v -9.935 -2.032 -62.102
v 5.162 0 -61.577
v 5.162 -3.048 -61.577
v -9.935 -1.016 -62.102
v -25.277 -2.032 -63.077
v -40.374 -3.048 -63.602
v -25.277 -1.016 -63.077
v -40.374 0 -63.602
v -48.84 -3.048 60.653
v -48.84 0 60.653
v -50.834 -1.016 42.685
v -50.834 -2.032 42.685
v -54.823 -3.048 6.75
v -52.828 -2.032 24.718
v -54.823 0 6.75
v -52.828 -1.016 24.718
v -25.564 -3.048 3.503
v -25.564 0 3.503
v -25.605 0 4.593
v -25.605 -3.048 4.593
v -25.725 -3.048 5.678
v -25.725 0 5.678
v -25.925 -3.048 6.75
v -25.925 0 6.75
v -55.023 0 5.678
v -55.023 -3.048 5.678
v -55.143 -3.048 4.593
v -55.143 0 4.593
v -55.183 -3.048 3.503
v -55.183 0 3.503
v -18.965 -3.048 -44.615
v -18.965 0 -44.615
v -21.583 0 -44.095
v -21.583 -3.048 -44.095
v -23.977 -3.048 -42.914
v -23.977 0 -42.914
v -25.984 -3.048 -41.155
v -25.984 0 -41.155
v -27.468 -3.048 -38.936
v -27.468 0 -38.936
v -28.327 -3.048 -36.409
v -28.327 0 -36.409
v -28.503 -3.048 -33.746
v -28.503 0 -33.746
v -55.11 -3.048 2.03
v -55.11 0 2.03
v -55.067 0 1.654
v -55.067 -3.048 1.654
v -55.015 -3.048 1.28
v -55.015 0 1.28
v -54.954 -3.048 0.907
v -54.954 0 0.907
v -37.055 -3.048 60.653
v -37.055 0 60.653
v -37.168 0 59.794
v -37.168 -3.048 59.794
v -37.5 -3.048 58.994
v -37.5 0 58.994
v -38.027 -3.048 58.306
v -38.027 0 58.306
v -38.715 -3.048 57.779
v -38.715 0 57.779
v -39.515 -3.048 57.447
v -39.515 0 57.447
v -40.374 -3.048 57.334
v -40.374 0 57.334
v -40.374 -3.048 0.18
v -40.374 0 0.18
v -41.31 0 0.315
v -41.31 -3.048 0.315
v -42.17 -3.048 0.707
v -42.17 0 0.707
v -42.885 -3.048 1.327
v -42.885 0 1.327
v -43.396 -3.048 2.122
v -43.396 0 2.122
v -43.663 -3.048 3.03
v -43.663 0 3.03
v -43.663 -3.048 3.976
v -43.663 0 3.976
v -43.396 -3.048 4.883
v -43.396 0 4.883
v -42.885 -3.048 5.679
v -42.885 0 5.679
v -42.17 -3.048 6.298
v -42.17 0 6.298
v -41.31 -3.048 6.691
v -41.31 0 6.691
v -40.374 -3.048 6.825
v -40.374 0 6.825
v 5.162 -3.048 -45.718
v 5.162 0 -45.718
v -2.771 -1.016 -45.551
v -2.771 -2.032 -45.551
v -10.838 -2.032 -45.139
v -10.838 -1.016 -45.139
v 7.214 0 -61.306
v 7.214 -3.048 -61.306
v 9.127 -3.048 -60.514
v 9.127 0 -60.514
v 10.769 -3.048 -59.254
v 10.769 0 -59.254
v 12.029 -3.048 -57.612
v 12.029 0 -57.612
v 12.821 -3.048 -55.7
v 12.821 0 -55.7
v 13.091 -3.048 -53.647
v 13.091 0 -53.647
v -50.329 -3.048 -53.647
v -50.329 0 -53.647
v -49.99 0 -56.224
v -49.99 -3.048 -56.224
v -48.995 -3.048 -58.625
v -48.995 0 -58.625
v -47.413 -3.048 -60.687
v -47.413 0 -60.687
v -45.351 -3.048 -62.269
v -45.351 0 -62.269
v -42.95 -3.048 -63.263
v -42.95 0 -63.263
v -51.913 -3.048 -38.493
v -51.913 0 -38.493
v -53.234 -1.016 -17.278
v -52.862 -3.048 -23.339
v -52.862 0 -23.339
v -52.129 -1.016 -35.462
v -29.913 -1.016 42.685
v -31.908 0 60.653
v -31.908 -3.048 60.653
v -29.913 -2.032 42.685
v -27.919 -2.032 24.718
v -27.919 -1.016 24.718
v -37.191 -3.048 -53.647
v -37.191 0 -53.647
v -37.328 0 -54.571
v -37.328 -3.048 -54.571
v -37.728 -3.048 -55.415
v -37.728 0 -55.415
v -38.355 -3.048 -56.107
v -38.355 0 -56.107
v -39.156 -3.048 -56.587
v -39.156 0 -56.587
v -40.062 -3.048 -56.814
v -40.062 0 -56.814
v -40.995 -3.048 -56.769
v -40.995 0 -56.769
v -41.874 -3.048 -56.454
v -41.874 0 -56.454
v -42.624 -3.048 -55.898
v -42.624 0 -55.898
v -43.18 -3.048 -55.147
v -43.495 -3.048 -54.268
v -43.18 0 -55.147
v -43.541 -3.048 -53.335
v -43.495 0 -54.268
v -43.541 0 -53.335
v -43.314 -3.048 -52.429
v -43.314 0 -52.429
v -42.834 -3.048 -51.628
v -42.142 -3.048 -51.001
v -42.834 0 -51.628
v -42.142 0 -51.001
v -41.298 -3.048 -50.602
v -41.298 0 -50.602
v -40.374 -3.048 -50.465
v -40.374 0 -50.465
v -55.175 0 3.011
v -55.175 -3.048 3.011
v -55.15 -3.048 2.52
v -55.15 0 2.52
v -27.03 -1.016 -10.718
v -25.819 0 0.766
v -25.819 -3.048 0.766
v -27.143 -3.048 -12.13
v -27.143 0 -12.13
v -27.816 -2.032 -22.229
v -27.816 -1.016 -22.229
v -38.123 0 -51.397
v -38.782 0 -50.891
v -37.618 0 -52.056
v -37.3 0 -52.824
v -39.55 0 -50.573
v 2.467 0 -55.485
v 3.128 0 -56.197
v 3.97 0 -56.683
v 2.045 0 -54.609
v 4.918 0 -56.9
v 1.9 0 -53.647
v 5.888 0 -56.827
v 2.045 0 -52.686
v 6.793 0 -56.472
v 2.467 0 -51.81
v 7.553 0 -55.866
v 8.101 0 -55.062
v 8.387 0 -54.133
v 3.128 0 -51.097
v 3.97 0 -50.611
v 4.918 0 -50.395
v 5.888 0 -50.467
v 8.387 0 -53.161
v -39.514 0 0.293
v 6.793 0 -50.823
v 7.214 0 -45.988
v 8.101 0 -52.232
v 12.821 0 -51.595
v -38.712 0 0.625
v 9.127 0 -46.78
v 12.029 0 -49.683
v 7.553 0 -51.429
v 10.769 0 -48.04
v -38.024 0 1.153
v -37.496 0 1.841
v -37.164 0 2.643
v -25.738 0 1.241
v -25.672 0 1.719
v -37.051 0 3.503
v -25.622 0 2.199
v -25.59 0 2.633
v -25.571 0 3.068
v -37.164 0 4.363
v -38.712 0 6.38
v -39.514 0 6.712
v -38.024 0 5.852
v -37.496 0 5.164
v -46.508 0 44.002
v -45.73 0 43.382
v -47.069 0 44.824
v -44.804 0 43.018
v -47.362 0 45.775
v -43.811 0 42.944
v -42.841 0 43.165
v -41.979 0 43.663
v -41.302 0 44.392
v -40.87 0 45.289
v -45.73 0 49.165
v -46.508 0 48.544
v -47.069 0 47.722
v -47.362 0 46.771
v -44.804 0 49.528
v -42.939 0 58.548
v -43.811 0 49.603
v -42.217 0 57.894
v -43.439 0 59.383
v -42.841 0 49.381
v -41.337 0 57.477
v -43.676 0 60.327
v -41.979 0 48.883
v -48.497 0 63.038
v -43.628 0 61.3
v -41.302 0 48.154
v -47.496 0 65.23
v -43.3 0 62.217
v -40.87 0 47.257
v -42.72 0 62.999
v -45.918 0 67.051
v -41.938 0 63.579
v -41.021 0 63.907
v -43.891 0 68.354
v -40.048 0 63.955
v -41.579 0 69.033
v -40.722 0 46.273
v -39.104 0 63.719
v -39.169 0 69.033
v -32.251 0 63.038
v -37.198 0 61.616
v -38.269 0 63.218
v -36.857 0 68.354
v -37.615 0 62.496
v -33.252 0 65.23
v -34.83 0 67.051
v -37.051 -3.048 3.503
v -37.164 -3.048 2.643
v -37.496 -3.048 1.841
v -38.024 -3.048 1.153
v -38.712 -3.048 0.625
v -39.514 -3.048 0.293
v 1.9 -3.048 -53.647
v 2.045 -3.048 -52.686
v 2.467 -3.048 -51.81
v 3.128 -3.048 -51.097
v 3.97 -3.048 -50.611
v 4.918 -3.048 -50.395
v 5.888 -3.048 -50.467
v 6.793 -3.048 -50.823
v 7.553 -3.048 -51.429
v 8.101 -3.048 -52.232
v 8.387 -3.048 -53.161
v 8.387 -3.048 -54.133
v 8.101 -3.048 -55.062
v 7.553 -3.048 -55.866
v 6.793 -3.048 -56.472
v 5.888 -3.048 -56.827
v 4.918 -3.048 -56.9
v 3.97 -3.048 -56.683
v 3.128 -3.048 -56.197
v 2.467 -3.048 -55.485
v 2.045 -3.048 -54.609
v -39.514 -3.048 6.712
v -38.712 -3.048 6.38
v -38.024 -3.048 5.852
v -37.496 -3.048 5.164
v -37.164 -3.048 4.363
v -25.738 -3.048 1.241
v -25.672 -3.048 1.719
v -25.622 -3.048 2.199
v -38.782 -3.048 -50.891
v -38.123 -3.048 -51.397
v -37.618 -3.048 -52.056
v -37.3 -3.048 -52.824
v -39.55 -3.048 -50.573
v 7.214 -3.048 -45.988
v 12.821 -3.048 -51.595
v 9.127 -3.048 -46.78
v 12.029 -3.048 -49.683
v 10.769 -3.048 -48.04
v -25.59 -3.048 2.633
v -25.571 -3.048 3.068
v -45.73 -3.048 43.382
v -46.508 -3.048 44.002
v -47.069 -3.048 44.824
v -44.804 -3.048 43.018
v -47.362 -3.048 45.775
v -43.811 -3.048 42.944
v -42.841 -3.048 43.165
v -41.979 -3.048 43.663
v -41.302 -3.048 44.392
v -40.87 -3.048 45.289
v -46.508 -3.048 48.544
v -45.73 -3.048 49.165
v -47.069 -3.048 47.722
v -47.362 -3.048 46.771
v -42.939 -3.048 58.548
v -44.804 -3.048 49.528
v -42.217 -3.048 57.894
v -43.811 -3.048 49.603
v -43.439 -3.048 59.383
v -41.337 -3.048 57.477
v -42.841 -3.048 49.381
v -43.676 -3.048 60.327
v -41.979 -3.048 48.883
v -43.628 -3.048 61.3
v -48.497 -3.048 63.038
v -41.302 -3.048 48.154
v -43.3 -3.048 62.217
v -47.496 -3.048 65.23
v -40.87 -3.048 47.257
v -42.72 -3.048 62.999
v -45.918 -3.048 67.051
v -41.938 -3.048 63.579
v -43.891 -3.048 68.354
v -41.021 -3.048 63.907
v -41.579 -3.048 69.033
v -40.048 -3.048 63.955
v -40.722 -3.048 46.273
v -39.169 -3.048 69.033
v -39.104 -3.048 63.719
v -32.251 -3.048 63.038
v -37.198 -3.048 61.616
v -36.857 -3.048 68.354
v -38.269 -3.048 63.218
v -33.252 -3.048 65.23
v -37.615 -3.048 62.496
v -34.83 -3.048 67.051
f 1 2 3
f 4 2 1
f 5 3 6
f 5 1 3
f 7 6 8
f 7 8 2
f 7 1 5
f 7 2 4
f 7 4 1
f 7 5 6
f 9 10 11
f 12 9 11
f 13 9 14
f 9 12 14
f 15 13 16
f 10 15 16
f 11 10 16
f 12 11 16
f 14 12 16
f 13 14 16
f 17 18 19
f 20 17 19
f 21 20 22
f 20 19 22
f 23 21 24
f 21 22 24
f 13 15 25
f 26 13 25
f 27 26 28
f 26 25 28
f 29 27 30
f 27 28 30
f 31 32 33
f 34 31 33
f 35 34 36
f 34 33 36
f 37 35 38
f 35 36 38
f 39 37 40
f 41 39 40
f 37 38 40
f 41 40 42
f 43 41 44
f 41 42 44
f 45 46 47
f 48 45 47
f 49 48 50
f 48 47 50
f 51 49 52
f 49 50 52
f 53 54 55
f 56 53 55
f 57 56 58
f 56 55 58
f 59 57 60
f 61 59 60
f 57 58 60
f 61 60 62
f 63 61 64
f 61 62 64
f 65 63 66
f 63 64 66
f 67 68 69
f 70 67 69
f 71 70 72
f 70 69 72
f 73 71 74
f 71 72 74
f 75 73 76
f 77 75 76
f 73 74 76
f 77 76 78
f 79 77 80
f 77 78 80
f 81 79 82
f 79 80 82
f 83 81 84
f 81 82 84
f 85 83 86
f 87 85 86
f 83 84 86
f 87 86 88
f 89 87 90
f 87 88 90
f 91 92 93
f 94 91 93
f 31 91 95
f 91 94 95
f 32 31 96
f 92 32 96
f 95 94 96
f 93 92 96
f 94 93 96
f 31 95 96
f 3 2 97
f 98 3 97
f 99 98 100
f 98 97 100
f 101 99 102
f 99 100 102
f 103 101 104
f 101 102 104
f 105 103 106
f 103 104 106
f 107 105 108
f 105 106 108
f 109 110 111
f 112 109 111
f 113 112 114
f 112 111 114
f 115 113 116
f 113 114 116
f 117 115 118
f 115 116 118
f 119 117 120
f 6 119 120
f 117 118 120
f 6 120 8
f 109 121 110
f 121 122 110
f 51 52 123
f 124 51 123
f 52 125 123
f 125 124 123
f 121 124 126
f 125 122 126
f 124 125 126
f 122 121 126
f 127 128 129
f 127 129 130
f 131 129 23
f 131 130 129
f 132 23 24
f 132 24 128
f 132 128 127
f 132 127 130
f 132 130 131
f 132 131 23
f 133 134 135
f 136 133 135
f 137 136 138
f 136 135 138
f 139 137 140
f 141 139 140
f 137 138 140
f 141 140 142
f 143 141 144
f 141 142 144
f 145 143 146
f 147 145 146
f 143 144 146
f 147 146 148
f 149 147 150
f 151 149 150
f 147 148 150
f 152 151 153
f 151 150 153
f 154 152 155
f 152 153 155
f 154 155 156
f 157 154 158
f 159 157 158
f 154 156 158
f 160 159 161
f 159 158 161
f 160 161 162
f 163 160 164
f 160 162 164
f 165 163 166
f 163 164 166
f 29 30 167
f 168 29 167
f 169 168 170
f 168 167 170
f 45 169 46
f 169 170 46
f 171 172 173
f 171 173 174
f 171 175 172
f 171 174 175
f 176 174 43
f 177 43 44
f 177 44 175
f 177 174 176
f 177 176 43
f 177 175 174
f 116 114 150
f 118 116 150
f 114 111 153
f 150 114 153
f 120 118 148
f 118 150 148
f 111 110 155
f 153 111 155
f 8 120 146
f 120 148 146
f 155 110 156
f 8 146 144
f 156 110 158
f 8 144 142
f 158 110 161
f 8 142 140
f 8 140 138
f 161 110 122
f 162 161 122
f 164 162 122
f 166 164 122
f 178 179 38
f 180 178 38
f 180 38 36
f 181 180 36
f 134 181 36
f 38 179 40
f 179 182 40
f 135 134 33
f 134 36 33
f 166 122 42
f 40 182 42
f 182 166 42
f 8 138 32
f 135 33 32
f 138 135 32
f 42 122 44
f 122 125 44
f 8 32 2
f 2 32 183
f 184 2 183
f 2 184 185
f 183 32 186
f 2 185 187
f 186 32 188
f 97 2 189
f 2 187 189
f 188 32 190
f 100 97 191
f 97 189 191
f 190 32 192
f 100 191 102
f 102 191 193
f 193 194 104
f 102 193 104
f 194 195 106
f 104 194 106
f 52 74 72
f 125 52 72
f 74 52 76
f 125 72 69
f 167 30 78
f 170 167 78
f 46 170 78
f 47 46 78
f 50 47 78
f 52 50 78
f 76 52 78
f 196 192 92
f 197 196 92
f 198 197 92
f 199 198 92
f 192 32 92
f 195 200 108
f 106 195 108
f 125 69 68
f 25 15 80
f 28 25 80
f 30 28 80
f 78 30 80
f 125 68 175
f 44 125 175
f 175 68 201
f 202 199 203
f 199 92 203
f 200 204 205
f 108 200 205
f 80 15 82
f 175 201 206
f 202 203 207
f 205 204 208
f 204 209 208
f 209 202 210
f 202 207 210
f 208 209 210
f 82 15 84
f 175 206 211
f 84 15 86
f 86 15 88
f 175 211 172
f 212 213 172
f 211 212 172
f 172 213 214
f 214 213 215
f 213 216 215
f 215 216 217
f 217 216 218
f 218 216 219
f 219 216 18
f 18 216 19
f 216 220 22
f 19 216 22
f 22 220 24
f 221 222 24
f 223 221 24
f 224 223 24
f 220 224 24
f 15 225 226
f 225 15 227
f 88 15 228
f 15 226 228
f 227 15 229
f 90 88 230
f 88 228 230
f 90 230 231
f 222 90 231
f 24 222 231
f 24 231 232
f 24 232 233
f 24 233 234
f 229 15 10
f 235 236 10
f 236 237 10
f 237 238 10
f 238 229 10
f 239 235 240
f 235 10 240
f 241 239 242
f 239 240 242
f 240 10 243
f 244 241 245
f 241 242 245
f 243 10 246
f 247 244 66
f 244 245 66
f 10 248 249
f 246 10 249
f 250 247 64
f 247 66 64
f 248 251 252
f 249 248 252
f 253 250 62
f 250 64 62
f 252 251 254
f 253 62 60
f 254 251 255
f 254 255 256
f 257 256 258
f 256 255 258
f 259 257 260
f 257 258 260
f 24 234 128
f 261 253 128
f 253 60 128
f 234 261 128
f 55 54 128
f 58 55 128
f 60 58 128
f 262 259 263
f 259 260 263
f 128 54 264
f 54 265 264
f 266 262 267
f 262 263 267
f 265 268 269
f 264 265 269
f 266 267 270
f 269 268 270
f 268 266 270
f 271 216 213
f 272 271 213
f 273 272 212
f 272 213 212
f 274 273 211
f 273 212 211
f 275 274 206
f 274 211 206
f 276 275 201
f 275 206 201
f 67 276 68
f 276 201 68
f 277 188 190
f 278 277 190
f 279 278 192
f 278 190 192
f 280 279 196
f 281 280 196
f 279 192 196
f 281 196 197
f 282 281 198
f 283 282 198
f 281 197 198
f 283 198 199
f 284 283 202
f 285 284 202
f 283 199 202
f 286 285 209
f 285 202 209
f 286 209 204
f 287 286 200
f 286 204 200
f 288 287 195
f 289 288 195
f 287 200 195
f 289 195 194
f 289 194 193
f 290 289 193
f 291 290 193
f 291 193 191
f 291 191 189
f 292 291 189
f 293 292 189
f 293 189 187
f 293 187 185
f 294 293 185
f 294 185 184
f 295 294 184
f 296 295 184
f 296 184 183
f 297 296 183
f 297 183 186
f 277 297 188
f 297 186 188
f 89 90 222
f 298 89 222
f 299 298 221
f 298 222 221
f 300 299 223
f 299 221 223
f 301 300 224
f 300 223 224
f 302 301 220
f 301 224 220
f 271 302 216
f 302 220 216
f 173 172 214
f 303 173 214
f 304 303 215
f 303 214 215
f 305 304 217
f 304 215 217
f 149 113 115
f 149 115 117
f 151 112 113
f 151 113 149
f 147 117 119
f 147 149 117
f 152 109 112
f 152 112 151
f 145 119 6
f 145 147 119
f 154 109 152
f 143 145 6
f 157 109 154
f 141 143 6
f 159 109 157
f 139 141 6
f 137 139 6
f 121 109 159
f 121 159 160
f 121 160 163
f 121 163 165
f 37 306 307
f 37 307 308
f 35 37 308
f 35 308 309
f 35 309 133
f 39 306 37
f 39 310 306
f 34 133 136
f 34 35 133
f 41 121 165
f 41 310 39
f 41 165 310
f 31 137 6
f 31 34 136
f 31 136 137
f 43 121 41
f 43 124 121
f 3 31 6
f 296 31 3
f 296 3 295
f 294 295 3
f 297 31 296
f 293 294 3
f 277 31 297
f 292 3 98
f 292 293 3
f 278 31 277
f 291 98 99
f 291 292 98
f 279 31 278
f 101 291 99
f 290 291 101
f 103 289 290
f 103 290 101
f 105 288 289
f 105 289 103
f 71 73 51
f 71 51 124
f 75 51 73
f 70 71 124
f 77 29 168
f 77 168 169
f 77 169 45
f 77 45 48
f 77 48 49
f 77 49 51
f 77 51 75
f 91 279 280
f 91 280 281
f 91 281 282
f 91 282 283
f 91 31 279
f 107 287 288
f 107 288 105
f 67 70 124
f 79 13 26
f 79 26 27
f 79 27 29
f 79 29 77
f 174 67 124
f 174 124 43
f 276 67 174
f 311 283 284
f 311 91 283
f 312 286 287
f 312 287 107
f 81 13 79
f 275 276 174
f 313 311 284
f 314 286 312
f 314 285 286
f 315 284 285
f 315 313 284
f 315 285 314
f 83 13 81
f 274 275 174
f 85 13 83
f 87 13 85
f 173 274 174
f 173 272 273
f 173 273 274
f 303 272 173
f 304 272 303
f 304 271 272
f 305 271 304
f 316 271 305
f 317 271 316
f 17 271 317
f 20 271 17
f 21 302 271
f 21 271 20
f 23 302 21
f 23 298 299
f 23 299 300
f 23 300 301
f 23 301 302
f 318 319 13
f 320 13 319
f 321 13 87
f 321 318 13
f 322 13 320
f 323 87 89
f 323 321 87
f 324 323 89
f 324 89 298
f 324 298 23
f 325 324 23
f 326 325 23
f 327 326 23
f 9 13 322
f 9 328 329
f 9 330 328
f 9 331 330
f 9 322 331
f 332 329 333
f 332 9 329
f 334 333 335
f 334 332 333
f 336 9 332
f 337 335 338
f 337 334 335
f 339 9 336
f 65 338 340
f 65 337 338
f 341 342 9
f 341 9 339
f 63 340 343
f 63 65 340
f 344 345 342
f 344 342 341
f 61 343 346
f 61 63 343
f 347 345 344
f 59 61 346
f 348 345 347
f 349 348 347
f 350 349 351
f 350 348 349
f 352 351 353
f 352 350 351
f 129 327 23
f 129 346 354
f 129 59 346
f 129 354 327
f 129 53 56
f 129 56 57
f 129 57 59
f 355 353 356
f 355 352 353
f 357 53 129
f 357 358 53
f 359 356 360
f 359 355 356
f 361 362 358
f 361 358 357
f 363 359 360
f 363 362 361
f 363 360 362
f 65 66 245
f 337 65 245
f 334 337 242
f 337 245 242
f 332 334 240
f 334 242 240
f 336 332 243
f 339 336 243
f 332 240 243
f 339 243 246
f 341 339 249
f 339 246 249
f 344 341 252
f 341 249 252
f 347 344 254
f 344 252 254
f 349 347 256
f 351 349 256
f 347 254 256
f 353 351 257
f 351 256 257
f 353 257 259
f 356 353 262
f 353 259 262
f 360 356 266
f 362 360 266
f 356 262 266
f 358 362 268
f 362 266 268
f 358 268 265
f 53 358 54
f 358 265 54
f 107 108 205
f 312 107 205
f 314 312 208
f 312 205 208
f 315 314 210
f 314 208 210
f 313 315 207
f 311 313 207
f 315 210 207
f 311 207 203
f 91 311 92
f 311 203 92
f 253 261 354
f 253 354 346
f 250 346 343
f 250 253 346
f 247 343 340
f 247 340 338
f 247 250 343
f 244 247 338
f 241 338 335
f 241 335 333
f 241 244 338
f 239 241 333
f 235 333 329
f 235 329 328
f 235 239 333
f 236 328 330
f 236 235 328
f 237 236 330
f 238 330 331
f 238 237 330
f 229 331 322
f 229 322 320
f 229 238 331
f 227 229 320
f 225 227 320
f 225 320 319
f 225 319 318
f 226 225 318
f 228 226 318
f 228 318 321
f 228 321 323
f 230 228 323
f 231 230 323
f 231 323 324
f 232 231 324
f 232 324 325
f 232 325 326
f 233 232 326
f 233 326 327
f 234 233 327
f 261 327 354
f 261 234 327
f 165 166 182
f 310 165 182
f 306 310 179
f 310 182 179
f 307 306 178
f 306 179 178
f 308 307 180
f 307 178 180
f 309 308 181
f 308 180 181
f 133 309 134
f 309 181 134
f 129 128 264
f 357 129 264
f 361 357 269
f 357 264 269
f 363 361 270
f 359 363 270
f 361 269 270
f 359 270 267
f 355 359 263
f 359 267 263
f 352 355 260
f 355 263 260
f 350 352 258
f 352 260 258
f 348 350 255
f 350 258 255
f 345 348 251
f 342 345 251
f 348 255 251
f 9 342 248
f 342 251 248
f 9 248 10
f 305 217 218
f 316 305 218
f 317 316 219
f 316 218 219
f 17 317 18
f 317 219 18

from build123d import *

# Parameters (mm, degrees)
F0_R     = 3.338805446
F1_DEPTH = 3.048


with BuildPart() as f1:
    # F0 (on Front) → F1 (new body)
    with BuildSketch(Plane.XZ):
        with BuildLine():
            ThreePointArc((-48.8398405267, 60.6527402997), (-46.3601680284, 54.6662813241), (-40.3737090528, 52.1866088258))
            ThreePointArc((-40.3737090528, 52.1866088258), (-34.3872500772, 54.6662813241), (-31.9075775789, 60.6527402997))
            ThreePointArc((-31.9075775789, 60.6527402997), (-40.3737090528, 69.1188717736), (-48.8398405267, 60.6527402997))
        make_face()
        with BuildLine():
            ThreePointArc((-37.0553247631, 60.6527402997), (-38.0272570189, 58.3062882658), (-40.3737090528, 57.33435601))
            ThreePointArc((-40.3737090528, 57.33435601), (-42.7201610867, 62.9991923336), (-37.0553247631, 60.6527402997))
        make_face(mode=Mode.SUBTRACT)
        with BuildLine():
            ThreePointArc((-31.9075775789, 60.6527402997), (-34.3872500772, 54.6662813241), (-40.3737090528, 52.1866088258))
            Line((-40.3737090528, 52.1866088258), (-40.3737090528, 18.3121075428))
            ThreePointArc((-40.3737090528, 18.3121075428), (-31.1210192063, 15.0658316355), (-25.9247871381, 6.75019883))
            add(Edge.make_bspline(
                [(-31.9075775789, 60.6527402997), (-29.9133140986, 42.6852264765), (-27.9190506183, 24.7177126532), (-25.9247871381, 6.75019883)],
                knots=[0, 0, 0, 0, 54.2335482737, 54.2335482737, 54.2335482737, 54.2335482737], degree=3))
        make_face()
        with BuildLine():
            Line((-40.3737090528, 18.3121075428), (-40.3737090528, 52.1866088258))
            ThreePointArc((-40.3737090528, 52.1866088258), (-46.3601680284, 54.6662813241), (-48.8398405267, 60.6527402997))
            add(Edge.make_bspline(
                [(-48.8398405267, 60.6527402997), (-50.834104007, 42.6852264765), (-52.8283674873, 24.7177126532), (-54.8226309675, 6.75019883)],
                knots=[0, 0, 0, 0, 54.2335482737, 54.2335482737, 54.2335482737, 54.2335482737], degree=3))
            ThreePointArc((-54.8226309675, 6.75019883), (-49.6263988993, 15.0658316355), (-40.3737090528, 18.3121075428))
        make_face()
        with Locations((-44.0608076751, 46.2730638683)):
            Circle(F0_R, mode=Mode.SUBTRACT)
        with BuildLine():
            ThreePointArc((-25.9247871381, 6.75019883), (-31.1210192063, 15.0658316355), (-40.3737090528, 18.3121075428))
            Line((-40.3737090528, 18.3121075428), (-40.3737090528, 6.825499461))
            ThreePointArc((-40.3737090528, 6.825499461), (-38.0241643353, 5.8522861736), (-37.0509510478, 3.502741456))
            ThreePointArc((-37.0509510478, 3.502741456), (-38.0241643353, 1.1531967385), (-40.3737090528, 0.1799834511))
            Line((-40.3737090528, 0.1799834511), (-40.3737090528, -11.3066246308))
            ThreePointArc((-40.3737090528, -11.3066246308), (-30.9189329127, -7.8957028253), (-25.8194413828, 0.7658423924))
            add(Edge.make_bspline(
                [(-25.6218092077, 2.199370882), (-25.689716363, 1.7216544124), (-25.7555582996, 1.2438093753), (-25.8194413828, 0.7658423924)],
                knots=[0, 0, 0, 0, 1.4434370692, 1.4434370692, 1.4434370692, 1.4434370692], degree=3))
            ThreePointArc((-25.6218092077, 2.199370882), (-25.5787165017, 2.850423048), (-25.564342966, 3.502741456))
            add(Edge.make_bspline(
                [(-25.9247871381, 6.75019883), (-25.8046390807, 5.6677130387), (-25.6844910233, 4.5852272473), (-25.564342966, 3.502741456)],
                knots=[54.2335482737, 54.2335482737, 54.2335482737, 54.2335482737, 57.500947759, 57.500947759, 57.500947759, 57.500947759], degree=3))
        make_face()
        with BuildLine():
            Line((-40.3737090528, 6.825499461), (-40.3737090528, 18.3121075428))
            ThreePointArc((-40.3737090528, 18.3121075428), (-49.6263988993, 15.0658316355), (-54.8226309675, 6.75019883))
            add(Edge.make_bspline(
                [(-54.8226309675, 6.75019883), (-54.9427790249, 5.6677130387), (-55.0629270823, 4.5852272473), (-55.1830751396, 3.502741456)],
                knots=[54.2335482737, 54.2335482737, 54.2335482737, 54.2335482737, 57.500947759, 57.500947759, 57.500947759, 57.500947759], degree=3))
            ThreePointArc((-55.1830751396, 3.502741456), (-55.16469891, 2.7652165843), (-55.1096158257, 2.0295220307))
            add(Edge.make_bspline(
                [(-55.1096158257, 2.0295220307), (-55.0564401475, 1.6554290587), (-55.0045376129, 1.2813360137), (-54.9538568961, 0.9072428986)],
                knots=[0, 0, 0, 0, 1.1264122236, 1.1264122236, 1.1264122236, 1.1264122236], degree=3))
            ThreePointArc((-54.9538568961, 0.9072428986), (-49.8836942152, -7.8496814617), (-40.3737090528, -11.3066246308))
            Line((-40.3737090528, -11.3066246308), (-40.3737090528, 0.1799834511))
            ThreePointArc((-40.3737090528, 0.1799834511), (-43.6964670578, 3.502741456), (-40.3737090528, 6.825499461))
        make_face()
        with BuildLine():
            ThreePointArc((-25.564342966, 3.502741456), (-25.6547298408, 5.1364411987), (-25.9247871381, 6.75019883))
            add(Edge.make_bspline(
                [(-25.9247871381, 6.75019883), (-25.8046390807, 5.6677130387), (-25.6844910233, 4.5852272473), (-25.564342966, 3.502741456)],
                knots=[54.2335482737, 54.2335482737, 54.2335482737, 54.2335482737, 57.500947759, 57.500947759, 57.500947759, 57.500947759], degree=3))
        make_face()
        with BuildLine():
            add(Edge.make_bspline(
                [(-54.8226309675, 6.75019883), (-54.9427790249, 5.6677130387), (-55.0629270823, 4.5852272473), (-55.1830751396, 3.502741456)],
                knots=[54.2335482737, 54.2335482737, 54.2335482737, 54.2335482737, 57.500947759, 57.500947759, 57.500947759, 57.500947759], degree=3))
            ThreePointArc((-54.8226309675, 6.75019883), (-55.0926882648, 5.1364411987), (-55.1830751396, 3.502741456))
        make_face()
        with BuildLine():
            ThreePointArc((-25.8194413828, 0.7658423924), (-30.9189329127, -7.8957028253), (-40.3737090528, -11.3066246308))
            Line((-40.3737090528, -11.3066246308), (-40.3737090528, -43.6920970678))
            add(Edge.make_bspline(
                [(-29.2968091513, -43.9985364744), (-33.0339667691, -43.8142378214), (-36.7371842262, -43.69209709), (-40.3737090528, -43.6920970678)],
                knots=[34.3884430891, 34.3884430891, 34.3884430891, 34.3884430891, 45.5806839994, 45.5806839994, 45.5806839994, 45.5806839994], degree=3))
            add(Edge.make_bspline(
                [(-28.5031349311, -33.745569321), (-28.7247903418, -37.1658958874), (-28.9765210206, -40.5843501576), (-29.2968091568, -43.9985364736)],
                knots=[36.0644801438, 36.0644801438, 36.0644801438, 36.0644801438, 46.3497924724, 46.3497924724, 46.3497924724, 46.3497924724], degree=3))
            add(Edge.make_bspline(
                [(-25.8194413828, 0.7658423924), (-27.3516862062, -10.698263565), (-27.7570281259, -22.2325233774), (-28.5031349311, -33.745569321)],
                knots=[1.4434370692, 1.4434370692, 1.4434370692, 1.4434370692, 36.0644801438, 36.0644801438, 36.0644801438, 36.0644801438], degree=3))
        make_face()
        with BuildLine():
            Line((-40.3737090528, -43.6920970678), (-40.3737090528, -11.3066246308))
            ThreePointArc((-40.3737090528, -11.3066246308), (-49.8836942152, -7.8496814617), (-54.9538568961, 0.9072428986))
            add(Edge.make_bspline(
                [(-54.9538568961, 0.9072428986), (-52.4902517713, -17.2775376799), (-52.9137553274, -35.4624837616), (-50.3288693726, -53.6472573876)],
                knots=[1.1264122236, 1.1264122236, 1.1264122236, 1.1264122236, 55.8816544409, 55.8816544409, 55.8816544409, 55.8816544409], degree=3))
            ThreePointArc((-50.3288693726, -53.6472573876), (-47.4130704227, -46.6078960177), (-40.3737090528, -43.6920970678))
        make_face()
        with BuildLine():
            ThreePointArc((-25.8194413828, 0.7658423924), (-25.703105296, 1.4801912576), (-25.6218092077, 2.199370882))
            add(Edge.make_bspline(
                [(-25.6218092077, 2.199370882), (-25.689716363, 1.7216544124), (-25.7555582996, 1.2438093753), (-25.8194413828, 0.7658423924)],
                knots=[0, 0, 0, 0, 1.4434370692, 1.4434370692, 1.4434370692, 1.4434370692], degree=3))
        make_face()
        with BuildLine():
            add(Edge.make_bspline(
                [(-55.1096158257, 2.0295220307), (-55.0564401475, 1.6554290587), (-55.0045376129, 1.2813360137), (-54.9538568961, 0.9072428986)],
                knots=[0, 0, 0, 0, 1.1264122236, 1.1264122236, 1.1264122236, 1.1264122236], degree=3))
            ThreePointArc((-55.1096158257, 2.0295220307), (-55.0424732194, 1.466892317), (-54.9538568961, 0.9072428986))
        make_face()
        with BuildLine():
            ThreePointArc((-30.418548733, -53.6472573876), (-33.3343476829, -46.6078960177), (-40.3737090528, -43.6920970678))
            Line((-40.3737090528, -43.6920970678), (-40.3737090528, -50.4648009147))
            ThreePointArc((-40.3737090528, -50.4648009147), (-38.1233724999, -51.3969208348), (-37.1912525798, -53.6472573876))
            Line((-37.1912525798, -53.6472573876), (-30.418548733, -53.6472573876))
        make_face()
        with BuildLine():
            add(Edge.make_bspline(
                [(-29.2968091513, -43.9985364744), (-33.0339667691, -43.8142378214), (-36.7371842262, -43.69209709), (-40.3737090528, -43.6920970678)],
                knots=[34.3884430891, 34.3884430891, 34.3884430891, 34.3884430891, 45.5806839994, 45.5806839994, 45.5806839994, 45.5806839994], degree=3))
            ThreePointArc((-40.3737090528, -43.6920970678), (-33.3343476829, -46.6078960177), (-30.418548733, -53.6472573876))
            add(Edge.make_bspline(
                [(-29.2968091568, -43.9985364736), (-29.5989469592, -47.2192450606), (-29.9620922477, -50.4361557069), (-30.418548733, -53.6472573876)],
                knots=[46.3497924724, 46.3497924724, 46.3497924724, 46.3497924724, 56.0522488324, 56.0522488324, 56.0522488324, 56.0522488324], degree=3))
        make_face()
        with BuildLine():
            Line((-40.3737090528, -50.4648009147), (-40.3737090528, -43.6920970678))
            ThreePointArc((-40.3737090528, -43.6920970678), (-47.4130704227, -46.6078960177), (-50.3288693726, -53.6472573876))
            ThreePointArc((-50.3288693726, -53.6472573876), (-47.4130704227, -60.6866187576), (-40.3737090528, -63.6024177074))
            ThreePointArc((-40.3737090528, -63.6024177074), (-33.3343476829, -60.6866187576), (-30.418548733, -53.6472573876))
            Line((-30.418548733, -53.6472573876), (-37.1912525798, -53.6472573876))
            ThreePointArc((-37.1912525798, -53.6472573876), (-42.6240456057, -55.8975939405), (-40.3737090528, -50.4648009147))
        make_face()
        with BuildLine():
            Line((-2.7674630824, -53.6472573876), (-30.418548733, -53.6472573876))
            ThreePointArc((-30.418548733, -53.6472573876), (-33.3343476829, -60.6866187576), (-40.3737090528, -63.6024177074))
            add(Edge.make_bspline(
                [(5.1619368605, -61.5766573305), (-9.6479024117, -61.5766574207), (-25.5638697806, -63.6024176172), (-40.3737090528, -63.6024177074)],
                knots=[0, 0, 0, 0, 45.5806839994, 45.5806839994, 45.5806839994, 45.5806839994], degree=3))
            ThreePointArc((5.1619368605, -61.5766573305), (-0.4449956098, -59.254189858), (-2.7674630824, -53.6472573876))
        make_face()
        with BuildLine():
            add(Edge.make_bspline(
                [(-29.2968091568, -43.9985364736), (-29.5989469592, -47.2192450606), (-29.9620922477, -50.4361557069), (-30.418548733, -53.6472573876)],
                knots=[46.3497924724, 46.3497924724, 46.3497924724, 46.3497924724, 56.0522488324, 56.0522488324, 56.0522488324, 56.0522488324], degree=3))
            Line((-30.418548733, -53.6472573876), (-2.7674630824, -53.6472573876))
            ThreePointArc((-2.7674630824, -53.6472573876), (-0.4449956098, -48.0403249173), (5.1619368605, -45.7178574448))
            add(Edge.make_bspline(
                [(5.1619368605, -45.7178574448), (-2.6797313071, -45.717857397), (-10.8315136759, -45.1499150115), (-18.9650052423, -44.6154703537)],
                knots=[0, 0, 0, 0, 24.1345359803, 24.1345359803, 24.1345359803, 24.1345359803], degree=3))
            add(Edge.make_bspline(
                [(-18.9650052423, -44.6154703537), (-22.4206369172, -44.3884038014), (-25.8729669225, -44.1673839182), (-29.2968091513, -43.9985364744)],
                knots=[24.1345359803, 24.1345359803, 24.1345359803, 24.1345359803, 34.3884430891, 34.3884430891, 34.3884430891, 34.3884430891], degree=3))
        make_face()
        with BuildLine():
            add(Edge.make_bspline(
                [(-28.5031349311, -33.745569321), (-28.7247903418, -37.1658958874), (-28.9765210206, -40.5843501576), (-29.2968091568, -43.9985364736)],
                knots=[36.0644801438, 36.0644801438, 36.0644801438, 36.0644801438, 46.3497924724, 46.3497924724, 46.3497924724, 46.3497924724], degree=3))
            add(Edge.make_bspline(
                [(-18.9650052423, -44.6154703537), (-22.4206369172, -44.3884038014), (-25.8729669225, -44.1673839182), (-29.2968091513, -43.9985364744)],
                knots=[24.1345359803, 24.1345359803, 24.1345359803, 24.1345359803, 34.3884430891, 34.3884430891, 34.3884430891, 34.3884430891], degree=3))
            ThreePointArc((-18.9650052423, -44.6154703537), (-25.9838678208, -41.1546742014), (-28.5031349311, -33.745569321))
        make_face()
        with BuildLine():
            ThreePointArc((5.1619368605, -45.7178574448), (-0.4449956098, -48.0403249173), (-2.7674630824, -53.6472573876))
            ThreePointArc((-2.7674630824, -53.6472573876), (-0.4449956098, -59.254189858), (5.1619368605, -61.5766573305))
            ThreePointArc((5.1619368605, -61.5766573305), (10.7688693309, -59.254189858), (13.0913368034, -53.6472573876))
            ThreePointArc((13.0913368034, -53.6472573876), (10.7688693309, -48.0403249173), (5.1619368605, -45.7178574448))
        make_face()
        with BuildLine():
            ThreePointArc((8.4235029173, -53.6472573876), (5.1619368605, -56.9088234444), (1.9003708038, -53.6472573876))
            ThreePointArc((1.9003708038, -53.6472573876), (5.1619368605, -50.3856913309), (8.4235029173, -53.6472573876))
        make_face(mode=Mode.SUBTRACT)
    extrude(amount=F1_DEPTH)


solid = f1.part
